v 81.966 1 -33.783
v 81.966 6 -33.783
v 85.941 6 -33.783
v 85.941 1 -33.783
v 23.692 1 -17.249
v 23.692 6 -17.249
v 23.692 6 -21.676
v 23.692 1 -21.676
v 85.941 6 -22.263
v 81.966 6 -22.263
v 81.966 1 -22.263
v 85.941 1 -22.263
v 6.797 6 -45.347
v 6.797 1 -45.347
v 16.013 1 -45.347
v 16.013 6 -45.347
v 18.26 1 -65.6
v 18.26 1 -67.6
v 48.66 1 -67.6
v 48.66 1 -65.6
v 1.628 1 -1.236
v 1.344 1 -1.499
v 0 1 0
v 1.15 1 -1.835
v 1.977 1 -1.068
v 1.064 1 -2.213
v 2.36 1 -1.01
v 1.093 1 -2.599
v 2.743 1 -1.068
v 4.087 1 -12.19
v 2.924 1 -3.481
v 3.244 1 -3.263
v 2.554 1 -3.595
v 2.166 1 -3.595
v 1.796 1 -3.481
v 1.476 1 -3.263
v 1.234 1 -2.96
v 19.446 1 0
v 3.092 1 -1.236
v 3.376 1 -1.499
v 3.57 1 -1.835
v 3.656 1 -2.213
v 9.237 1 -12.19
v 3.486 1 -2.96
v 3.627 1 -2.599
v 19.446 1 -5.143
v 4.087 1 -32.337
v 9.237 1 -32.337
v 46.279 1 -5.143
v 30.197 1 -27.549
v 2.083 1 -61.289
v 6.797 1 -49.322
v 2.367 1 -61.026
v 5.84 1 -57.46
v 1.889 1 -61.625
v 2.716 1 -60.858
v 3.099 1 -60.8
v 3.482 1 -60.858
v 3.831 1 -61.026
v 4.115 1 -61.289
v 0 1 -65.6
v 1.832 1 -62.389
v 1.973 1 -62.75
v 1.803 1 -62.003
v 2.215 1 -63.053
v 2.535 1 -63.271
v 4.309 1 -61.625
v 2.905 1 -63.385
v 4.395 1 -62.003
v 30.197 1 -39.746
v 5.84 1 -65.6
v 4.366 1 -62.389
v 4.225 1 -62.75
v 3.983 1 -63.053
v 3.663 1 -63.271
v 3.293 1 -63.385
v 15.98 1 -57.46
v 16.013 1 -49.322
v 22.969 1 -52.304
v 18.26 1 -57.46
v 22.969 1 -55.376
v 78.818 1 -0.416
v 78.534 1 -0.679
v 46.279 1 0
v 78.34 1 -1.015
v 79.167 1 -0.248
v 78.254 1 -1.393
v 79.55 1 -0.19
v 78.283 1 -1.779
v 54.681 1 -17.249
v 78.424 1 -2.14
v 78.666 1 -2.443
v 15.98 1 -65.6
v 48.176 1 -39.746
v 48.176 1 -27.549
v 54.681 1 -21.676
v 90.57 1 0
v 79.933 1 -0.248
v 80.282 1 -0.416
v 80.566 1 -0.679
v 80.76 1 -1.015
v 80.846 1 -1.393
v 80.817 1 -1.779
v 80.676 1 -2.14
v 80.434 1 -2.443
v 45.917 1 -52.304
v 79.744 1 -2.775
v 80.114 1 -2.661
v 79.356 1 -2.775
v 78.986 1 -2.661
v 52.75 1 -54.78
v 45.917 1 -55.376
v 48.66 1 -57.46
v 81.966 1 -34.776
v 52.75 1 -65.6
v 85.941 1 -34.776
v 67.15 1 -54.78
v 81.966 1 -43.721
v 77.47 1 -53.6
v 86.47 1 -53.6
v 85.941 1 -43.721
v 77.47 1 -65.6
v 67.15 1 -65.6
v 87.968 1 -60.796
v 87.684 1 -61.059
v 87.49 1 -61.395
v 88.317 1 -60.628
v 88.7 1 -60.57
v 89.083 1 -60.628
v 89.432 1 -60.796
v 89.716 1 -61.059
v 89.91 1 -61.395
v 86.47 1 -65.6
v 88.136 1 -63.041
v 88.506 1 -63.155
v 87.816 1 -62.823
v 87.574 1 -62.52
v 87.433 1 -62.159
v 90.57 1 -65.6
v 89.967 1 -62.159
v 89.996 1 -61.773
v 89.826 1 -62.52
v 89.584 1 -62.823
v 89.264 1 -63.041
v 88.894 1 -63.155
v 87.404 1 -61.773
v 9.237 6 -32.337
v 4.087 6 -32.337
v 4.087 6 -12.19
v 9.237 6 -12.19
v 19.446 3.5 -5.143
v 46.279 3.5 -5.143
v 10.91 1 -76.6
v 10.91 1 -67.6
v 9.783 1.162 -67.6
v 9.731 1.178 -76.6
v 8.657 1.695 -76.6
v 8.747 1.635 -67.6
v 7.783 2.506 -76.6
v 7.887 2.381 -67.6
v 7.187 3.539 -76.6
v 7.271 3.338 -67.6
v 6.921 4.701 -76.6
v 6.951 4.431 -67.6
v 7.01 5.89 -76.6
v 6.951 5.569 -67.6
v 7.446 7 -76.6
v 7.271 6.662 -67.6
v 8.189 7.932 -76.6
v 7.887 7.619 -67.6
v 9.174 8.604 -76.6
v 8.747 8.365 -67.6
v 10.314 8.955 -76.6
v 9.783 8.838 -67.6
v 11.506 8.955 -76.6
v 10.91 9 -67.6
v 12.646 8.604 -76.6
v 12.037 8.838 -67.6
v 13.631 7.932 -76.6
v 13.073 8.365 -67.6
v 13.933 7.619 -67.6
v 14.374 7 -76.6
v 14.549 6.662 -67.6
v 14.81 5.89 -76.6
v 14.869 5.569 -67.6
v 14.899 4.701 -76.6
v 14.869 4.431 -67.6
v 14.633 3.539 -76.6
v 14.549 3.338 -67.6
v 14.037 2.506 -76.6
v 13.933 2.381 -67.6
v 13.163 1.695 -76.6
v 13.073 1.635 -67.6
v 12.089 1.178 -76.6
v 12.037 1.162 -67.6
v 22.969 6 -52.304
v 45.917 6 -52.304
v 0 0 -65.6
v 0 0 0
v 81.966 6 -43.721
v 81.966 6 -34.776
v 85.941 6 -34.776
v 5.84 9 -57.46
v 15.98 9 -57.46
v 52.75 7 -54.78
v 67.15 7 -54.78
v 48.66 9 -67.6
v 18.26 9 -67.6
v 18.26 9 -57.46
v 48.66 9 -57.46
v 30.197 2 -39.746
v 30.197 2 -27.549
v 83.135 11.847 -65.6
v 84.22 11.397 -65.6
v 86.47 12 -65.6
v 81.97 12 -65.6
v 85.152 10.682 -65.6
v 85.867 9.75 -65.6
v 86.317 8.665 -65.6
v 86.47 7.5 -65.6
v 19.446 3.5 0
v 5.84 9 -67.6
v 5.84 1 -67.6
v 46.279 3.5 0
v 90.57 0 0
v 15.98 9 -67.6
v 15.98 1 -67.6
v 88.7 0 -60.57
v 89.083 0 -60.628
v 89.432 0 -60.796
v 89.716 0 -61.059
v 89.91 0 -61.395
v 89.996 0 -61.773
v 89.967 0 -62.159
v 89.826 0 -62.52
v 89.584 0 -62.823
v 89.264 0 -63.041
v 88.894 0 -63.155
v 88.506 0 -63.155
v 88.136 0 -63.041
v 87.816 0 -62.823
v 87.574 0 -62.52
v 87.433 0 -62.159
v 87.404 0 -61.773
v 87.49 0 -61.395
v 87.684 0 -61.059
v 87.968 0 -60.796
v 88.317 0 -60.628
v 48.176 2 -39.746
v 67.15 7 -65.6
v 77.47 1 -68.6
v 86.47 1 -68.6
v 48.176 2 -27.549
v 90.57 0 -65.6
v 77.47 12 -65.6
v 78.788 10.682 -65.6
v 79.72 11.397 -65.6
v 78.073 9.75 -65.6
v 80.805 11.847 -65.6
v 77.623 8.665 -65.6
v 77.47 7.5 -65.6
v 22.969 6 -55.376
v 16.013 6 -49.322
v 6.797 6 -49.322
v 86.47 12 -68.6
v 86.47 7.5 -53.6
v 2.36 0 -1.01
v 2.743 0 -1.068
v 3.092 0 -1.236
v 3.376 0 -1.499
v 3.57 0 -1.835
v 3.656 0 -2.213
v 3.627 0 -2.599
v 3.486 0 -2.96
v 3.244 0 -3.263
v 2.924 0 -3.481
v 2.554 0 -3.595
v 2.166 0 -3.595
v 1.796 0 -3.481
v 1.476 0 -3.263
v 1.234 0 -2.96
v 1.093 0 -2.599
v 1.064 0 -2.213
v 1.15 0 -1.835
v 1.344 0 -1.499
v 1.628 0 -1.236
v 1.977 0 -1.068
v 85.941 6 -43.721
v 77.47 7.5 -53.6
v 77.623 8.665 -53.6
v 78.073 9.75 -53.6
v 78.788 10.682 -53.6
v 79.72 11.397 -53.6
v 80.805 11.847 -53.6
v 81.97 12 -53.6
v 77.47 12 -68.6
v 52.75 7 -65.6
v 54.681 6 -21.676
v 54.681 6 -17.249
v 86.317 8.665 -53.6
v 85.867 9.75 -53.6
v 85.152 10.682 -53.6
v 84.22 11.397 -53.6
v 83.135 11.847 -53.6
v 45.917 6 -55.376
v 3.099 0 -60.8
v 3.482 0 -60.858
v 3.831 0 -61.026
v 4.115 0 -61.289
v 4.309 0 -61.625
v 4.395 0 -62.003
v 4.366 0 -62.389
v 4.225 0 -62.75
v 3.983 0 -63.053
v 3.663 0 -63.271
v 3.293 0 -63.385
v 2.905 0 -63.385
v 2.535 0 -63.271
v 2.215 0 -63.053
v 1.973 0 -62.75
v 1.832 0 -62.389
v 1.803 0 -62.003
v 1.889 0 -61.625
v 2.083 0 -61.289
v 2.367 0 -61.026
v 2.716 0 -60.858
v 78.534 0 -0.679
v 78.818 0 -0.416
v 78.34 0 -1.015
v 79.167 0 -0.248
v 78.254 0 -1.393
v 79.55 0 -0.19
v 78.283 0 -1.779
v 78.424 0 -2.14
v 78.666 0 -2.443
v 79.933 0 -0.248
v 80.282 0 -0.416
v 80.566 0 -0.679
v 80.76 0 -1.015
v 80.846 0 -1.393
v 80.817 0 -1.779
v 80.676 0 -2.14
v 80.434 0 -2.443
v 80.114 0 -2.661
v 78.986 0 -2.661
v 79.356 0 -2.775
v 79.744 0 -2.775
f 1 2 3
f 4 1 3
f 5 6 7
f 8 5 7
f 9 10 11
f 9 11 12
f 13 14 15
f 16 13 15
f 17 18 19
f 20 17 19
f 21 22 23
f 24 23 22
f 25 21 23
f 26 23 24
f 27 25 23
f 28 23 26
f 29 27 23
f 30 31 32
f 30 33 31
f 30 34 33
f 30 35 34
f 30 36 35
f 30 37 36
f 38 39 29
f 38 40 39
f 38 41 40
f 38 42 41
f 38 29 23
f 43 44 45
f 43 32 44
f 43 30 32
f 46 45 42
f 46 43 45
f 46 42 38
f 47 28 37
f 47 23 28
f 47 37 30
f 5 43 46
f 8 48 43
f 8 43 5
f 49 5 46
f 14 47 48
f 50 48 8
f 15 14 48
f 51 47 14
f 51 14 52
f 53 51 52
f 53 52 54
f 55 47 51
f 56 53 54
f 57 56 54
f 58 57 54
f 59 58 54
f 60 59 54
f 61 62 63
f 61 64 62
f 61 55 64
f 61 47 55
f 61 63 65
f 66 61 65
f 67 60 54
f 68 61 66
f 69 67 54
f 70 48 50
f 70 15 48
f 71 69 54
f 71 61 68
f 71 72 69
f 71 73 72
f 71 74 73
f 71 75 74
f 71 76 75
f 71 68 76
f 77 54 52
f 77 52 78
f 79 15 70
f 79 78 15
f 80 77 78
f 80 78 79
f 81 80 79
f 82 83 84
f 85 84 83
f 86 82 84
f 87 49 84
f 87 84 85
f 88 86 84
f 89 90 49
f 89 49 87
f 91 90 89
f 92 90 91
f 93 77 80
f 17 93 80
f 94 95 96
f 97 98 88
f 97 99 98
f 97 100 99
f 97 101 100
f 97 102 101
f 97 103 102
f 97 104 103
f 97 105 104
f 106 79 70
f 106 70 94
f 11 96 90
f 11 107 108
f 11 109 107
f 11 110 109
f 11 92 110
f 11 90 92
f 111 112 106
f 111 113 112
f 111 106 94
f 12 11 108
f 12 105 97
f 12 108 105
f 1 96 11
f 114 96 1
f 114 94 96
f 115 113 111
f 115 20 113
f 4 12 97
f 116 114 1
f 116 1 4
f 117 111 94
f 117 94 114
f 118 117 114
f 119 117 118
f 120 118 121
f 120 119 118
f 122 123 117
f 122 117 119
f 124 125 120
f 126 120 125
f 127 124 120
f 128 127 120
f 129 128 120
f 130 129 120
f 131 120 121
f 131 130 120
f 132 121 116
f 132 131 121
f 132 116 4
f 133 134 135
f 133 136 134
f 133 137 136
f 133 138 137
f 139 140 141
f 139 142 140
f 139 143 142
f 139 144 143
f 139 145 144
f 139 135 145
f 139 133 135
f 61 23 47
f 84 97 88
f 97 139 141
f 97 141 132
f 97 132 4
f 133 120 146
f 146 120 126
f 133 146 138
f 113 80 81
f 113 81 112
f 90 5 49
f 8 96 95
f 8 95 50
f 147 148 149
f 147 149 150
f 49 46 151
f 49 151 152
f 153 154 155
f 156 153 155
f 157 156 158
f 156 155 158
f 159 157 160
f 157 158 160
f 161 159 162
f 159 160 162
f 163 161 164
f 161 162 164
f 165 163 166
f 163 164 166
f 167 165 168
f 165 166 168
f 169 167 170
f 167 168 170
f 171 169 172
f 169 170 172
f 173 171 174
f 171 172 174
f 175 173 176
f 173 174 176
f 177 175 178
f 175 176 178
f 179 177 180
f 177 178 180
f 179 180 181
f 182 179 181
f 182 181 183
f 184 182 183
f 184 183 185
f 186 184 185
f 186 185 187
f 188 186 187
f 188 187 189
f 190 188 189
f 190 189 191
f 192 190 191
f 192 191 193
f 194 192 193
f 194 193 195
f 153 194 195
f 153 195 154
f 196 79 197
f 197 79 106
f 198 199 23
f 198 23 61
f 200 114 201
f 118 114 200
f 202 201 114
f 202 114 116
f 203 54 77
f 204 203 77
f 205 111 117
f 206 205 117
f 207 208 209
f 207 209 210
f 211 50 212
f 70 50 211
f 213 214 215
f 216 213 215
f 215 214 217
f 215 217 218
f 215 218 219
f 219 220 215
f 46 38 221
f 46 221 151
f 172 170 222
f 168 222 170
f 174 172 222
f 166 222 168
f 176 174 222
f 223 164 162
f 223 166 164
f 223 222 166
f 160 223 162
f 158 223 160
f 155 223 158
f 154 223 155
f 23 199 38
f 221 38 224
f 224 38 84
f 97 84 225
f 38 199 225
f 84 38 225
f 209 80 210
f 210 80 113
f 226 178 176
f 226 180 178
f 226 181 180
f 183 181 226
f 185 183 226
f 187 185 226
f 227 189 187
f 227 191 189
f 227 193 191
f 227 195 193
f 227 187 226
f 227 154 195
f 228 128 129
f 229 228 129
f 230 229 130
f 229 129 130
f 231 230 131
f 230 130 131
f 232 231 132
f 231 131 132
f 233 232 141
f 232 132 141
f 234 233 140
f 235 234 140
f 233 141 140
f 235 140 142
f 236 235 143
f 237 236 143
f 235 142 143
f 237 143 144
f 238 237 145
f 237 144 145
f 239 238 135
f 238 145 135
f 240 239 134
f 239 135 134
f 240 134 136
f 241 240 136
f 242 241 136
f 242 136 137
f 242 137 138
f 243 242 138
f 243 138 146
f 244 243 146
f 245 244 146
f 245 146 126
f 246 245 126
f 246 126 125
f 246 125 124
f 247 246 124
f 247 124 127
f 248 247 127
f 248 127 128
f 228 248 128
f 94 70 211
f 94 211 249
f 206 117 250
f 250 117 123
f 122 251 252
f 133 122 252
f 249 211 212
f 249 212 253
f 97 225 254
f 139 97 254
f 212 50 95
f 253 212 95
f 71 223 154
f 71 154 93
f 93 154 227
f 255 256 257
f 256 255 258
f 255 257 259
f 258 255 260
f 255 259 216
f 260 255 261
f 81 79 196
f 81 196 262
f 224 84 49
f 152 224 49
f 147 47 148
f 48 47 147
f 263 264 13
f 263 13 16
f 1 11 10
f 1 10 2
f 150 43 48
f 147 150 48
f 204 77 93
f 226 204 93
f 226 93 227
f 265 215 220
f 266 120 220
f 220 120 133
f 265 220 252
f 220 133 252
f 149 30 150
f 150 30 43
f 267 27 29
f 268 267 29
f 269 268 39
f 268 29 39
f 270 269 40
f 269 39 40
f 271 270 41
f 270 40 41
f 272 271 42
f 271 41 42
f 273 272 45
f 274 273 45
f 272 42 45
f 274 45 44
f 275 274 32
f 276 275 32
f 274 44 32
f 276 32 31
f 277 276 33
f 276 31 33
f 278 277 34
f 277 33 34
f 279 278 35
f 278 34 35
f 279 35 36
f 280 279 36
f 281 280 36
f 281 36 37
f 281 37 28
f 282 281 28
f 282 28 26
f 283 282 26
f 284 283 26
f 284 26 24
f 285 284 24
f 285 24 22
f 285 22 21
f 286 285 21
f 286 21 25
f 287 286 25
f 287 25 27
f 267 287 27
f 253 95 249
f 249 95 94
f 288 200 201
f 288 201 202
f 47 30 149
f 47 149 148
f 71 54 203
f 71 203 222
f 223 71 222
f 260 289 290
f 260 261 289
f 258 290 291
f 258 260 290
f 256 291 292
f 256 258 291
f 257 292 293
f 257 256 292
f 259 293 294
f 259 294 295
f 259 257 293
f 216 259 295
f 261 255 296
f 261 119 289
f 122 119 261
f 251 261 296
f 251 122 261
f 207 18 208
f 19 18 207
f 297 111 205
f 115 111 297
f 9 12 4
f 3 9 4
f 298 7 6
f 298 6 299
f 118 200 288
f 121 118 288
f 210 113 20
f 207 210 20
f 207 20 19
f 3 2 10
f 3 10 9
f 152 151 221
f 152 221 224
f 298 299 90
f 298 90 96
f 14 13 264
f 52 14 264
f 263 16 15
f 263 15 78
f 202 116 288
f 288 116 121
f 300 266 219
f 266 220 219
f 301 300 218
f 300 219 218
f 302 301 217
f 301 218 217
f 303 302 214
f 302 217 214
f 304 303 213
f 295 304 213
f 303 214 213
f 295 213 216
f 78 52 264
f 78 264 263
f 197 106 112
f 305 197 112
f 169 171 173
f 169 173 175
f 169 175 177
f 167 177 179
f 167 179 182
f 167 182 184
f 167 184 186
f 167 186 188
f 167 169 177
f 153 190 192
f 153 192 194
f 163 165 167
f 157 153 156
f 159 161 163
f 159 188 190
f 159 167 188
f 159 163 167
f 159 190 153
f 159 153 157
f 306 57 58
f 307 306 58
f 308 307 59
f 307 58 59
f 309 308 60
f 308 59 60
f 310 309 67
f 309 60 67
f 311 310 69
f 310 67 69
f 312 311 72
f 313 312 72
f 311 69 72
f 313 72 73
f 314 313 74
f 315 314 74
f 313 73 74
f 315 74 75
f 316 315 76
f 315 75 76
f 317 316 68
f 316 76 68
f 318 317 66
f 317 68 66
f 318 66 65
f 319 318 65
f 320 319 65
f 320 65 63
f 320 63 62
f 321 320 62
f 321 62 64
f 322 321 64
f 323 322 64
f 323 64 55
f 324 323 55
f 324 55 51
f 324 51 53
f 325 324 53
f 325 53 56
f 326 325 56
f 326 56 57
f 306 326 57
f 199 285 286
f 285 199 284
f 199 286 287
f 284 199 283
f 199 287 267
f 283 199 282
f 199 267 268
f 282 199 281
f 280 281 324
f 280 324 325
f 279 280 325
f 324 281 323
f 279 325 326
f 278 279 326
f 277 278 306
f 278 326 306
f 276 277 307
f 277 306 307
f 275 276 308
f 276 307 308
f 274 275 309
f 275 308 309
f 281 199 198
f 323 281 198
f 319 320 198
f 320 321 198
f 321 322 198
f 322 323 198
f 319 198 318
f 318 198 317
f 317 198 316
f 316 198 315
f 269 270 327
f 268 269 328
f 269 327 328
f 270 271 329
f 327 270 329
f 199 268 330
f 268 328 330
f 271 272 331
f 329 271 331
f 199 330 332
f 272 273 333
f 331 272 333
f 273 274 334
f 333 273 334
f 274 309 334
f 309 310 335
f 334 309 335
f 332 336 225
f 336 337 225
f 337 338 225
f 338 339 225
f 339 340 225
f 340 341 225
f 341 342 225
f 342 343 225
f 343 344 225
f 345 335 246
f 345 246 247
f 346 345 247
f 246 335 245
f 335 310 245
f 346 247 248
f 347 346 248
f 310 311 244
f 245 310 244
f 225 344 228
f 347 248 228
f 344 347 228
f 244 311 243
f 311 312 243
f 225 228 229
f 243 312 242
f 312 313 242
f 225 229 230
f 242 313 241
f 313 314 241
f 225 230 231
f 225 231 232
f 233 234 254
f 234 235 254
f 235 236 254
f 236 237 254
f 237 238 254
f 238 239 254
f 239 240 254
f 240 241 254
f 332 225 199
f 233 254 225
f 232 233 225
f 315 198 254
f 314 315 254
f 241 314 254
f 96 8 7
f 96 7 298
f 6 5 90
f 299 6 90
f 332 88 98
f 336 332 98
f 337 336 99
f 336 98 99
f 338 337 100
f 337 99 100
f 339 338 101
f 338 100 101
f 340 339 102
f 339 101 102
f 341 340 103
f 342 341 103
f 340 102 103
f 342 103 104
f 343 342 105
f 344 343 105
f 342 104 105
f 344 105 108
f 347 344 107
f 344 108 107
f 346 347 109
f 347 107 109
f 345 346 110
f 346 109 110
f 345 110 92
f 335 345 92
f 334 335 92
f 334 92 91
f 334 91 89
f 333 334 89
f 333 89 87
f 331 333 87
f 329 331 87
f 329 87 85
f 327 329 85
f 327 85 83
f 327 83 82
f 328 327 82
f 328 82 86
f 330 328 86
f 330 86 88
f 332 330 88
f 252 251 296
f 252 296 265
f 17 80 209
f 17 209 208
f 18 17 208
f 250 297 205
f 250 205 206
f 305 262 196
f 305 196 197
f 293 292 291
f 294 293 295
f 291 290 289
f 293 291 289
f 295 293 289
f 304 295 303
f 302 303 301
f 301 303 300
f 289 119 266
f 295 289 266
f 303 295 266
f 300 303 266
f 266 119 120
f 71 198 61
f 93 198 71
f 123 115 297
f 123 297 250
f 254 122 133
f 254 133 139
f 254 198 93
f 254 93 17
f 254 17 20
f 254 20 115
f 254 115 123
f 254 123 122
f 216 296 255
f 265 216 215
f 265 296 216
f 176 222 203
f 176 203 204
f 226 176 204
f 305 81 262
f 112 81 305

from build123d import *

# Parameters (mm, degrees)
SKETCH1_W            = 90.57
SKETCH1_H            = 65.6
BOSS_EXTRUDE1_DEPTH  = 1
SKETCH2_R            = 1.3
CUT_EXTRUDE1_DEPTH   = 112.835973193
SKETCH3_W            = 10.14
SKETCH3_H            = 10.14
SKETCH3_W_2          = 30.4
BOSS_EXTRUDE2_DEPTH  = 8
SKETCH4_W            = 14.4
SKETCH4_H            = 10.82
BOSS_EXTRUDE3_DEPTH  = 6
SKETCH5_W            = 9
SKETCH5_H            = 12
BOSS_EXTRUDE4_DEPTH  = 11
FILLET2_R            = 4.5
SKETCH7_W            = 9
SKETCH7_H            = 3
BOSS_EXTRUDE5_DEPTH  = 11
SKETCH8_R            = 4
BOSS_EXTRUDE6_DEPTH  = 9
SKETCH9_W            = 22.948138565
SKETCH9_H            = 3.071798075
SKETCH9_W_2          = 9.215394227
SKETCH9_H_2          = 3.975268097
SKETCH9_W_3          = 5.149779126
SKETCH9_H_3          = 20.147381496
SKETCH9_W_4          = 3.975268098
SKETCH9_H_4          = 8.94435322
SKETCH9_H_5          = 11.519242784
BOSS_EXTRUDE7_DEPTH  = 5
SKETCH10_W           = 17.979053442
SKETCH10_H           = 12.196845301
BOSS_EXTRUDE8_DEPTH  = 1
SKETCH12_W           = 26.83305966
SKETCH12_H           = 5.142650184
BOSS_EXTRUDE9_DEPTH  = 2.5
SKETCH13_W           = 30.989021763
SKETCH13_H           = 4.427003109
BOSS_EXTRUDE10_DEPTH = 5


with BuildPart() as part:
    # Sketch1 → Boss-Extrude1 (new body)
    with BuildSketch(Plane(origin=(0, 0, 0), x_dir=(1, 0, 0), z_dir=(0, 1, 0))):
        with Locations((45.285, 32.8)):
            Rectangle(SKETCH1_W, SKETCH1_H)
    extrude(amount=BOSS_EXTRUDE1_DEPTH)

    # Sketch2 → Cut-Extrude1 (cut, through all)
    with BuildSketch(Plane(origin=(0, 1, 0), x_dir=(1, 0, 0), z_dir=(0, 1, 0))):
        with Locations(Location((2.36, 2.31, 0), (0, 0, 270))):
            Circle(SKETCH2_R)
        with Locations(Location((3.099, 62.1, 0), (0, 0, 270))):
            Circle(SKETCH2_R)
        with Locations(Location((88.7, 61.87, 0), (0, 0, 270))):
            Circle(SKETCH2_R)
        with Locations(Location((79.55, 1.49, 0), (0, 0, 270))):
            Circle(SKETCH2_R)
    extrude(amount=-CUT_EXTRUDE1_DEPTH, mode=Mode.SUBTRACT)

    # Sketch3 → Boss-Extrude2 (add)
    with BuildSketch(Plane(origin=(0, 1, 0), x_dir=(1, 0, 0), z_dir=(0, 1, 0))):
        with Locations((10.91, 62.53)):
            Rectangle(SKETCH3_W, SKETCH3_H)
        with Locations((33.46, 62.53)):
            Rectangle(SKETCH3_W_2, SKETCH3_H)
    extrude(amount=BOSS_EXTRUDE2_DEPTH)

    # Sketch4 → Boss-Extrude3 (add)
    with BuildSketch(Plane(origin=(0, 1, 0), x_dir=(1, 0, 0), z_dir=(0, 1, 0))):
        with Locations((59.95, 60.19)):
            Rectangle(SKETCH4_W, SKETCH4_H)
    extrude(amount=BOSS_EXTRUDE3_DEPTH)

    # Sketch5 → Boss-Extrude4 (add)
    with BuildSketch(Plane(origin=(0, 1, 0), x_dir=(1, 0, 0), z_dir=(0, 1, 0))):
        with Locations((81.97, 59.6)):
            Rectangle(SKETCH5_W, SKETCH5_H)
    extrude(amount=BOSS_EXTRUDE4_DEPTH)

    # Fillet2
    fillet2_edges = [part.edges().sort_by_distance(p)[0] for p in [
        (86.47, 12, -59.6),
        (77.47, 12, -59.6),
    ]]
    fillet(fillet2_edges, radius=FILLET2_R - 0.0001)  # a hair under: the kernel refuses the full size

    # Sketch7 → Boss-Extrude5 (add)
    with BuildSketch(Plane(origin=(0, 1, 0), x_dir=(1, 0, 0), z_dir=(0, 1, 0))):
        with Locations((81.97, 67.1)):
            Rectangle(SKETCH7_W, SKETCH7_H)
    extrude(amount=BOSS_EXTRUDE5_DEPTH)

    # Sketch8 → Boss-Extrude6 (add)
    with BuildSketch(Plane(origin=(0, 0, -67.6), x_dir=(-1, 0, 0), z_dir=(0, 0, -1))):
        with Locations(Location((-10.91, 5, 0), (0, 0, 270))):
            Circle(SKETCH8_R)
    extrude(amount=BOSS_EXTRUDE6_DEPTH)

    # Sketch9 → Boss-Extrude7 (add)
    with BuildSketch(Plane(origin=(0, 1, 0), x_dir=(1, 0, 0), z_dir=(0, 1, 0))):
        with Locations((34.443359734, 53.839684383)):
            Rectangle(SKETCH9_W, SKETCH9_H)
        with Locations((11.404874166, 47.334700223)):
            Rectangle(SKETCH9_W_2, SKETCH9_H_2)
        with Locations((6.661656549, 22.263407105)):
            Rectangle(SKETCH9_W_3, SKETCH9_H_3)
        with Locations((83.953516952, 39.248643523)):
            Rectangle(SKETCH9_W_4, SKETCH9_H_4)
        with Locations((83.953516952, 28.023028497)):
            Rectangle(SKETCH9_W_4, SKETCH9_H_5)
    extrude(amount=BOSS_EXTRUDE7_DEPTH)

    # Sketch10 → Boss-Extrude8 (add)
    with BuildSketch(Plane(origin=(0, 1, 0), x_dir=(1, 0, 0), z_dir=(0, 1, 0))):
        with Locations((39.18657735, 33.647129386)):
            Rectangle(SKETCH10_W, SKETCH10_H)
    extrude(amount=BOSS_EXTRUDE8_DEPTH)

    # Sketch12 → Boss-Extrude9 (add)
    with BuildSketch(Plane(origin=(0, 1, 0), x_dir=(1, 0, 0), z_dir=(0, 1, 0))):
        with Locations((32.862287194, 2.571325092)):
            Rectangle(SKETCH12_W, SKETCH12_H)
    extrude(amount=BOSS_EXTRUDE9_DEPTH)

    # Sketch13 → Boss-Extrude10 (add)
    with BuildSketch(Plane(origin=(0, 1, 0), x_dir=(1, 0, 0), z_dir=(0, 1, 0))):
        with Locations((39.186577349, 19.462650037)):
            Rectangle(SKETCH13_W, SKETCH13_H)
    extrude(amount=BOSS_EXTRUDE10_DEPTH)


solid = part.part
